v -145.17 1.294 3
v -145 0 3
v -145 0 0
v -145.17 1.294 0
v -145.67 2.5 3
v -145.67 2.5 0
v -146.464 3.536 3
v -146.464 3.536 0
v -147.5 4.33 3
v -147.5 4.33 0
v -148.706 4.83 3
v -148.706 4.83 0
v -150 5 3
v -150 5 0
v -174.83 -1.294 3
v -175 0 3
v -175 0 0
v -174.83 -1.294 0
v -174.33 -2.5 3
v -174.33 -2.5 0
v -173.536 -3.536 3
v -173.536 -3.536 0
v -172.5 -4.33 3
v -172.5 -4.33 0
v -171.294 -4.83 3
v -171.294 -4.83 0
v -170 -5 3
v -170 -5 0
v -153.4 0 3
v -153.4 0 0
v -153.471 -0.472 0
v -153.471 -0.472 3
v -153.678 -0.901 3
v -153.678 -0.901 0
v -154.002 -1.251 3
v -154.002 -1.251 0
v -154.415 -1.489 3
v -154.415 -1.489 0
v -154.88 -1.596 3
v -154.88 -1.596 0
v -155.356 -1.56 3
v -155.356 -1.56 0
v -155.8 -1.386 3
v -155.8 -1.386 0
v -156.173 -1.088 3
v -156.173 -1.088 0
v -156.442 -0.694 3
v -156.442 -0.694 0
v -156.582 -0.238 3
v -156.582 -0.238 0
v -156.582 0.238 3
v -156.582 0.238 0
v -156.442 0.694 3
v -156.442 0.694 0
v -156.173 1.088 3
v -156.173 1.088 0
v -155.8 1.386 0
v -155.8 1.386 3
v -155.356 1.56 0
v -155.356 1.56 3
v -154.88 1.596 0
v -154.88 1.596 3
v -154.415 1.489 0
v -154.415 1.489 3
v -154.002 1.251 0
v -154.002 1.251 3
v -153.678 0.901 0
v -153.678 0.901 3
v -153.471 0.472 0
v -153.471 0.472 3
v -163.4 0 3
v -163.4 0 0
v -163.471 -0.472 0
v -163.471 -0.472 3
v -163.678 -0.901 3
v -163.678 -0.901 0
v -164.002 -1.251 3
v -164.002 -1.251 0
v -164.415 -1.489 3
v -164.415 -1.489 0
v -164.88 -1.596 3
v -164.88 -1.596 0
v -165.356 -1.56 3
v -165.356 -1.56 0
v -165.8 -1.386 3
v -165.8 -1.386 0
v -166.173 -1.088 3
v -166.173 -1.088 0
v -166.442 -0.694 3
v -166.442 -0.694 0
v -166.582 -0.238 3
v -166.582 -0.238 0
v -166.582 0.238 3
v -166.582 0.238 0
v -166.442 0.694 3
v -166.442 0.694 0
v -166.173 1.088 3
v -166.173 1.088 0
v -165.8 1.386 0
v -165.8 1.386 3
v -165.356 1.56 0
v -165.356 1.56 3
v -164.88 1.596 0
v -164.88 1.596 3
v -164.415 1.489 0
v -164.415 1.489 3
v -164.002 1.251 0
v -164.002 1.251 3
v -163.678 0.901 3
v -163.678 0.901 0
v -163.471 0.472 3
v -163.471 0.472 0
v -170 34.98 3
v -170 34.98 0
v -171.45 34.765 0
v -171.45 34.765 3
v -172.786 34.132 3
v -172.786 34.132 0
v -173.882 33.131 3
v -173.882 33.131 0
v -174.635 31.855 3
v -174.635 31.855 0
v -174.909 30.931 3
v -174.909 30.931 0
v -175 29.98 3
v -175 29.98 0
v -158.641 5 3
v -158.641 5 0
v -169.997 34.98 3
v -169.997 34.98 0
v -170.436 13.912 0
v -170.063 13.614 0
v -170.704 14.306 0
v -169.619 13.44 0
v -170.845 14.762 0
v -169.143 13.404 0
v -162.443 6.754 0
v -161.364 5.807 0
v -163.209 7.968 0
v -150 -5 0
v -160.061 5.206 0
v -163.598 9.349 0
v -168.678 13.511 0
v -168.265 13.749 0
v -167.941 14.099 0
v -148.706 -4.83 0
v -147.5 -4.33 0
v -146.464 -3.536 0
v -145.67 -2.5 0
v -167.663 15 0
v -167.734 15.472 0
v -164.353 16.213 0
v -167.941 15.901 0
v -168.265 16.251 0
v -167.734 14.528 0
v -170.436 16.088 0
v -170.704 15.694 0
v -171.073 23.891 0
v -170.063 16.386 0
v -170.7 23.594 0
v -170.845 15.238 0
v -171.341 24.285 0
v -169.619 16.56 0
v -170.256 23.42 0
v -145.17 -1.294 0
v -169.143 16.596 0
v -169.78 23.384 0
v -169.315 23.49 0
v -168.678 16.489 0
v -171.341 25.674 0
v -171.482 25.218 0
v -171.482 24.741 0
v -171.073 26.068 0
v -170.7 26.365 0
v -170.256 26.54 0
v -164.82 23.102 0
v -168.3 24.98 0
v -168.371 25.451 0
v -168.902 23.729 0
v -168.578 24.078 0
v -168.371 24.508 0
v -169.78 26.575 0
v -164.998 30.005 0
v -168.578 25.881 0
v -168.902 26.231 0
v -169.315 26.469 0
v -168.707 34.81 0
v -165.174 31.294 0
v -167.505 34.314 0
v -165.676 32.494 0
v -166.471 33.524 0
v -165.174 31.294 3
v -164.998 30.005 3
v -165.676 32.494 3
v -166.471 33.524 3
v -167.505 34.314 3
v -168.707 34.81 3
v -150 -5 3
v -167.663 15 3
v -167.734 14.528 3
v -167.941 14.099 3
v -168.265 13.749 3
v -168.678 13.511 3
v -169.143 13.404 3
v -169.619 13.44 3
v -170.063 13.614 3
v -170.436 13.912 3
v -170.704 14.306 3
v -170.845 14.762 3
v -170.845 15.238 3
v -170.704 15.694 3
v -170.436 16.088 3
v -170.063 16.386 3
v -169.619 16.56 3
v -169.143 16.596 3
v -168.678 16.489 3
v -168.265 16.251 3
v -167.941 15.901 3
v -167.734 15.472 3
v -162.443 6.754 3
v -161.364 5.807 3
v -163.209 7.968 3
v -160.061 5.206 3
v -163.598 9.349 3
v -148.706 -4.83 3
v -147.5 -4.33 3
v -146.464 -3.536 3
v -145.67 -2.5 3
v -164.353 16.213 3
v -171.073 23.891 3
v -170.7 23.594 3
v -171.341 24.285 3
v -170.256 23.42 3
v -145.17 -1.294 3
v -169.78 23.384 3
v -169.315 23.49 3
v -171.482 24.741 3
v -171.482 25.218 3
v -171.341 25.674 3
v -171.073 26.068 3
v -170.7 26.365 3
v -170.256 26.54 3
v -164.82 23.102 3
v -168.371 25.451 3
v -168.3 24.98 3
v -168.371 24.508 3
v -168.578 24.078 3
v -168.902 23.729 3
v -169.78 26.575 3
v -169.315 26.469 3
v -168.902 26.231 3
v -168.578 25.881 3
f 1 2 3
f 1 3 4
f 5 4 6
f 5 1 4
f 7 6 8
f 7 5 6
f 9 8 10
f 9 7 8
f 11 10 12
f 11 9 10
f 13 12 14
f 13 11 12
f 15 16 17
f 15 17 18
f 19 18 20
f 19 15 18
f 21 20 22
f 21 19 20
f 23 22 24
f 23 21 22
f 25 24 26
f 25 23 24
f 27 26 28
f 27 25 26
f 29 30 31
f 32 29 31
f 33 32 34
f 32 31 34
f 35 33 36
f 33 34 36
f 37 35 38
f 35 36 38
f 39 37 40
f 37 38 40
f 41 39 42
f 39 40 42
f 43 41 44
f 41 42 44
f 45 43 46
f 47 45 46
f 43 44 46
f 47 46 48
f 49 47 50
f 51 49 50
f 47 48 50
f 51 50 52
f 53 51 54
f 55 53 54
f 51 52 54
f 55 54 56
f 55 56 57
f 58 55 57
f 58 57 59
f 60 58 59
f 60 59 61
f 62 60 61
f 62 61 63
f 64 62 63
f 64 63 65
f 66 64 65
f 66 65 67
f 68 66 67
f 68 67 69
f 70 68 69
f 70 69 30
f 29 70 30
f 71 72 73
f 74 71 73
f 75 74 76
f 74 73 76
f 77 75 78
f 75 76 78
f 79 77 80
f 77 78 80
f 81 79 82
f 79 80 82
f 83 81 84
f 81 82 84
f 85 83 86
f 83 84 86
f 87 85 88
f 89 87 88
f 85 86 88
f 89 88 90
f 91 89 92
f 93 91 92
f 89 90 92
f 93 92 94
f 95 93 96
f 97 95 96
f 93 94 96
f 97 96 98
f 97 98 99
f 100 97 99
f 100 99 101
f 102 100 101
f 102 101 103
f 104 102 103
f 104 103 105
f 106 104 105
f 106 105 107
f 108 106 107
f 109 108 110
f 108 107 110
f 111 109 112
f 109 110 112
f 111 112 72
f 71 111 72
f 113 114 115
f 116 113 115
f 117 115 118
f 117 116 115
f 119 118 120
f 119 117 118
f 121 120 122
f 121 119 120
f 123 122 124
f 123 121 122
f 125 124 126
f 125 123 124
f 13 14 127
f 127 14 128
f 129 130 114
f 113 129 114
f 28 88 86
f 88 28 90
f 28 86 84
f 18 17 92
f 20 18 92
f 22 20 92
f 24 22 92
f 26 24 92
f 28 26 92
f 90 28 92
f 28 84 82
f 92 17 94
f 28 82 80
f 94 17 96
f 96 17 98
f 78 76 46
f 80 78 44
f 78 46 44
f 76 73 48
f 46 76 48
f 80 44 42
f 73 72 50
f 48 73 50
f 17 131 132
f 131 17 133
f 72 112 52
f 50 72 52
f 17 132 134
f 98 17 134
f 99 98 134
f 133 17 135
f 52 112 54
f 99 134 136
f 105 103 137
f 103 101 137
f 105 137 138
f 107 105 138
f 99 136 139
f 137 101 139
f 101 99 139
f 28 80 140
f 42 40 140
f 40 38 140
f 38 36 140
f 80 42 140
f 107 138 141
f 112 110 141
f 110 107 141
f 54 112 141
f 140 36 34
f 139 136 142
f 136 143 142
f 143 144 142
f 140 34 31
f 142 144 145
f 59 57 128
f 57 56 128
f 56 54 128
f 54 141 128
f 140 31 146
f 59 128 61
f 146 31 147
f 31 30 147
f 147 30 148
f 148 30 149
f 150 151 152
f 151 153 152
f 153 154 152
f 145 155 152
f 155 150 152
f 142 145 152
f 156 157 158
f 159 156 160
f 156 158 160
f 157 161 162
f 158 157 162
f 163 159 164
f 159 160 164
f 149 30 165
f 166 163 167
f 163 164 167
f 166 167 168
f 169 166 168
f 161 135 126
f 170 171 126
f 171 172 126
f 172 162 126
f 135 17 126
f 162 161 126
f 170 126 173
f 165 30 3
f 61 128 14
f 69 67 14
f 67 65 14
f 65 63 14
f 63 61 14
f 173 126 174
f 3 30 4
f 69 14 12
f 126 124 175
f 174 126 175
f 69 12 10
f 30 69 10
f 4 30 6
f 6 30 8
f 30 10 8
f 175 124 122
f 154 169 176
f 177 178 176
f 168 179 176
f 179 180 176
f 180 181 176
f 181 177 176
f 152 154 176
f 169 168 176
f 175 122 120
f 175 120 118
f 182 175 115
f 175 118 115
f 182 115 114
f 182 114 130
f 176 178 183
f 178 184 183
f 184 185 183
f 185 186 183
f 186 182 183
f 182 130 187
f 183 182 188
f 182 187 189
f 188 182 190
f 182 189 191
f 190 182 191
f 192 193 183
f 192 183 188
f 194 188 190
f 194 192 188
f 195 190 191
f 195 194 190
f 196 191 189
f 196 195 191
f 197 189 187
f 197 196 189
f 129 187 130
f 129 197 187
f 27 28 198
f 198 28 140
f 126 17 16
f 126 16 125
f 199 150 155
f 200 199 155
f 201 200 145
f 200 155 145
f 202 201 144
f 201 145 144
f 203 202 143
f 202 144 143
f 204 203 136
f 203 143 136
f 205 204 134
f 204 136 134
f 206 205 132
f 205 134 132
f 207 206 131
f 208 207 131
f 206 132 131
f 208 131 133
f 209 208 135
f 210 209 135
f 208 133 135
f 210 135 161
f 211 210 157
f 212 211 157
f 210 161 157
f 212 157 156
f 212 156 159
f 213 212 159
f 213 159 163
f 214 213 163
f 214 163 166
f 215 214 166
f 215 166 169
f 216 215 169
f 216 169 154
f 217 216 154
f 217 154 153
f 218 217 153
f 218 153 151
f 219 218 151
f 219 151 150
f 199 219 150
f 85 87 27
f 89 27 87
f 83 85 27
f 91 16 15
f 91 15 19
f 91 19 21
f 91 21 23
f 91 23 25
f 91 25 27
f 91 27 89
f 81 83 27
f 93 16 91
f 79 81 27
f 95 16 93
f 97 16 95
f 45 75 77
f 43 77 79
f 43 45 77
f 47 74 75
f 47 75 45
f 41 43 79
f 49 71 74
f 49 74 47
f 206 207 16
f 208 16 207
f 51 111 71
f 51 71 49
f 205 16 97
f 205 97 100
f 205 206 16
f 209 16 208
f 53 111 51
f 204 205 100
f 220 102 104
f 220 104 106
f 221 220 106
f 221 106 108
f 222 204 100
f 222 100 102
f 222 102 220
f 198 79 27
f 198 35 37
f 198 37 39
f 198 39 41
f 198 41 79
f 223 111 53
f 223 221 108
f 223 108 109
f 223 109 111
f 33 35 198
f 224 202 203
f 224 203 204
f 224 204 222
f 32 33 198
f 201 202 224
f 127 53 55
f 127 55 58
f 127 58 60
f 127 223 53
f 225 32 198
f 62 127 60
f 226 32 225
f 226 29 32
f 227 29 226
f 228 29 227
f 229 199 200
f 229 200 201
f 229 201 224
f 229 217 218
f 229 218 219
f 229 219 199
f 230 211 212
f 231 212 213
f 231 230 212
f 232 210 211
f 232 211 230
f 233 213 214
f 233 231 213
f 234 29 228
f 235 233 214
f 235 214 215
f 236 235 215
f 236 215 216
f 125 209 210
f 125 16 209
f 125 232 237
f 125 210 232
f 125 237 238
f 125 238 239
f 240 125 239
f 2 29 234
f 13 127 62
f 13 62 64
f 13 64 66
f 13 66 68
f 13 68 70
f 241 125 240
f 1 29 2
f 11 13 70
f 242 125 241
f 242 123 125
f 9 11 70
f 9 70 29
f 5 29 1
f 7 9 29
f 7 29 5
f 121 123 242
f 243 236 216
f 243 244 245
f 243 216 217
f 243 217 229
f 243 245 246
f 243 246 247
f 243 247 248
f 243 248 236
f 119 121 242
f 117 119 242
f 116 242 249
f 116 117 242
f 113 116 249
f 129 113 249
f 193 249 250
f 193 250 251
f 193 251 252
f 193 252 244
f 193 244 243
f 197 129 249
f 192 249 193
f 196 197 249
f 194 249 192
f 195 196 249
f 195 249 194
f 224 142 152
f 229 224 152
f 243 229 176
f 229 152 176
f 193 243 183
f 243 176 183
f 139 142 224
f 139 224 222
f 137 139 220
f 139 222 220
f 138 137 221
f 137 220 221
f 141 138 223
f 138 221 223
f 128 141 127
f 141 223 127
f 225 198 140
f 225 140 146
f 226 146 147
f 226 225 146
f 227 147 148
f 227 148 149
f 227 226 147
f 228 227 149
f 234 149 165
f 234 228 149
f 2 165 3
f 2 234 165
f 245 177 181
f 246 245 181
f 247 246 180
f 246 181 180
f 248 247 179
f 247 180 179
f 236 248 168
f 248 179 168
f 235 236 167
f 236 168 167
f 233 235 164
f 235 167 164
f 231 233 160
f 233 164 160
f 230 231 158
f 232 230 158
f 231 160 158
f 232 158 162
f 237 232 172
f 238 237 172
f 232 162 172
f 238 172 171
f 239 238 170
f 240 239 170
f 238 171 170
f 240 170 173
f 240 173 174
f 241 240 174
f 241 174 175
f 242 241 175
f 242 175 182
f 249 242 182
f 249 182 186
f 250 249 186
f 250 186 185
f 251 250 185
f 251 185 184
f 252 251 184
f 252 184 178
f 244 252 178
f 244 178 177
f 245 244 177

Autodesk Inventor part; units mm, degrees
ref_plane "YZ Plane" through (0, 0, 0) normal (1, 0, 0) x (0, 1, 0)
ref_plane "XZ Plane" through (0, 0, 0) normal (0, 1, 0) x (-1, 0, 0)
ref_plane "XY Plane" through (0, 0, 0) normal (0, 0, 1) x (1, 0, 0)
sketch "スケッチ1" plane through (0, 0, 0) normal (0, 0, 1) x (1, 0, 0)
  line L0 (195, -7.5) -> (-195, -7.5)
  line L1 (-195, -7.5) -> (-195, 7.5)
  line L2 (-195, 7.5) -> (195, 7.5)
  line L3 (195, 7.5) -> (195, -7.5)
  line L4 (195, -7.5) -> (-195, 7.5) construction
  line L5 (-195, -7.5) -> (195, 7.5) construction
  circle A0 centre (0, 70.8153) radius 120
  line L6 (0, -7.5) -> (0, 7.5)
  circle A1 centre (-127.5, -22.5) radius 38
  line L7 (-175, -5) -> (-145, -5)
  line L8 (-145, -5) -> (-145, 5)
  line L9 (-145, 5) -> (-175, 5)
  line L10 (-175, 5) -> (-175, -5)
  line L11 (-195, 0) -> (195, 0)
  circle A2 centre (-175, 0) radius 1.6
  circle A3 centre (-165, 0) radius 1.6
  circle A4 centre (-155, 0) radius 1.6
  line L12 (0, 190.8153) -> (0, -49.1847)
  arc A5 (156.5411, -2.2739) -> (-157.0045, 0) centre (0, 30.8153) ccw
  arc A6 (161.433, -3.3079) -> (-162.968, 5) centre (0, 30.8153) ccw
  arc A7 (166.3249, -4.342) -> (-168.0285, 5) centre (0, 30.8153) ccw
  arc A8 (171.2168, -5.376) -> (-173.0854, 5) centre (0, 30.8153) ccw
  circle A9 centre (-169.2627, 15) radius 1.6
  circle A10 centre (-169.8998, 24.9797) radius 1.6
  line L13 (-164.9474, 34.9797) -> (-174.9504, 34.9797)
  line L14 (-175, -5) -> (-175, 30.8153)
  point P0 (0, 0)
  point P1 (-165, 0)
  point P2 (-175, 0)
  point P3 (-174.3906, 5)
  point P4 (-164.3536, 5)
  point P5 (-175, -1.6)
  point P6 (-175, 1.6)
  dimension "d0" = 390
  dimension "d1" = 15
  dimension "d2" = 240
  dimension "d3" = 76
  dimension "d4" = 30
  dimension "d5" = 67.5
  dimension "d9" = 10
  dimension "d10" = 10
  dimension "d11" = 20
  dimension "d13" = 10
  dimension "d14" = 10
  dimension "d16" = 3.2
  dimension "d17" = 3.2
  dimension "d19" = 3.2
  dimension "d28" = 40
  dimension "d29" = 5
  dimension "d30" = 5
  dimension "d31" = 5
  dimension "d32" = 3.2
  dimension "d33" = 3.2
  dimension "d34" = 15
  dimension "d35" = 10
  dimension "d36" = 10
extrude "押し出し1" add sketch "スケッチ1" along normal blind 3 contours L13 A7 A10 A9 L2 A8 | L11 A4 A5 A1 L9 L8 | L8 L7 A1 L11 A4 | L13 A6 L2 A7 A9 A10 | A8 L2 L14 | L7 L10 A2 L11 A3 A1 | A8 L9 L14 L2 | L2 A7 L9 A8 | L11 A3 A2 L10 L9 A5 A1 | A1 A5 L11 | A6 L9 A7 L2 | L9 A1 A5 | L10 L11 A2 | A2 L11 L10 picked at (-174.4361, -0.8975) picked at (-174.4361, 0.8975)
fillet "フィレット1" radius 5 6 edges at (-175, -5, 1.5) (-145, -5, 1.5) (-145, 5, 1.5) (-174.9504, 34.9797, 1.5) (-164.9474, 34.9797, 1.5) (-162.968, 5, 1.5)
properties part number "light_ball_space_nc"
